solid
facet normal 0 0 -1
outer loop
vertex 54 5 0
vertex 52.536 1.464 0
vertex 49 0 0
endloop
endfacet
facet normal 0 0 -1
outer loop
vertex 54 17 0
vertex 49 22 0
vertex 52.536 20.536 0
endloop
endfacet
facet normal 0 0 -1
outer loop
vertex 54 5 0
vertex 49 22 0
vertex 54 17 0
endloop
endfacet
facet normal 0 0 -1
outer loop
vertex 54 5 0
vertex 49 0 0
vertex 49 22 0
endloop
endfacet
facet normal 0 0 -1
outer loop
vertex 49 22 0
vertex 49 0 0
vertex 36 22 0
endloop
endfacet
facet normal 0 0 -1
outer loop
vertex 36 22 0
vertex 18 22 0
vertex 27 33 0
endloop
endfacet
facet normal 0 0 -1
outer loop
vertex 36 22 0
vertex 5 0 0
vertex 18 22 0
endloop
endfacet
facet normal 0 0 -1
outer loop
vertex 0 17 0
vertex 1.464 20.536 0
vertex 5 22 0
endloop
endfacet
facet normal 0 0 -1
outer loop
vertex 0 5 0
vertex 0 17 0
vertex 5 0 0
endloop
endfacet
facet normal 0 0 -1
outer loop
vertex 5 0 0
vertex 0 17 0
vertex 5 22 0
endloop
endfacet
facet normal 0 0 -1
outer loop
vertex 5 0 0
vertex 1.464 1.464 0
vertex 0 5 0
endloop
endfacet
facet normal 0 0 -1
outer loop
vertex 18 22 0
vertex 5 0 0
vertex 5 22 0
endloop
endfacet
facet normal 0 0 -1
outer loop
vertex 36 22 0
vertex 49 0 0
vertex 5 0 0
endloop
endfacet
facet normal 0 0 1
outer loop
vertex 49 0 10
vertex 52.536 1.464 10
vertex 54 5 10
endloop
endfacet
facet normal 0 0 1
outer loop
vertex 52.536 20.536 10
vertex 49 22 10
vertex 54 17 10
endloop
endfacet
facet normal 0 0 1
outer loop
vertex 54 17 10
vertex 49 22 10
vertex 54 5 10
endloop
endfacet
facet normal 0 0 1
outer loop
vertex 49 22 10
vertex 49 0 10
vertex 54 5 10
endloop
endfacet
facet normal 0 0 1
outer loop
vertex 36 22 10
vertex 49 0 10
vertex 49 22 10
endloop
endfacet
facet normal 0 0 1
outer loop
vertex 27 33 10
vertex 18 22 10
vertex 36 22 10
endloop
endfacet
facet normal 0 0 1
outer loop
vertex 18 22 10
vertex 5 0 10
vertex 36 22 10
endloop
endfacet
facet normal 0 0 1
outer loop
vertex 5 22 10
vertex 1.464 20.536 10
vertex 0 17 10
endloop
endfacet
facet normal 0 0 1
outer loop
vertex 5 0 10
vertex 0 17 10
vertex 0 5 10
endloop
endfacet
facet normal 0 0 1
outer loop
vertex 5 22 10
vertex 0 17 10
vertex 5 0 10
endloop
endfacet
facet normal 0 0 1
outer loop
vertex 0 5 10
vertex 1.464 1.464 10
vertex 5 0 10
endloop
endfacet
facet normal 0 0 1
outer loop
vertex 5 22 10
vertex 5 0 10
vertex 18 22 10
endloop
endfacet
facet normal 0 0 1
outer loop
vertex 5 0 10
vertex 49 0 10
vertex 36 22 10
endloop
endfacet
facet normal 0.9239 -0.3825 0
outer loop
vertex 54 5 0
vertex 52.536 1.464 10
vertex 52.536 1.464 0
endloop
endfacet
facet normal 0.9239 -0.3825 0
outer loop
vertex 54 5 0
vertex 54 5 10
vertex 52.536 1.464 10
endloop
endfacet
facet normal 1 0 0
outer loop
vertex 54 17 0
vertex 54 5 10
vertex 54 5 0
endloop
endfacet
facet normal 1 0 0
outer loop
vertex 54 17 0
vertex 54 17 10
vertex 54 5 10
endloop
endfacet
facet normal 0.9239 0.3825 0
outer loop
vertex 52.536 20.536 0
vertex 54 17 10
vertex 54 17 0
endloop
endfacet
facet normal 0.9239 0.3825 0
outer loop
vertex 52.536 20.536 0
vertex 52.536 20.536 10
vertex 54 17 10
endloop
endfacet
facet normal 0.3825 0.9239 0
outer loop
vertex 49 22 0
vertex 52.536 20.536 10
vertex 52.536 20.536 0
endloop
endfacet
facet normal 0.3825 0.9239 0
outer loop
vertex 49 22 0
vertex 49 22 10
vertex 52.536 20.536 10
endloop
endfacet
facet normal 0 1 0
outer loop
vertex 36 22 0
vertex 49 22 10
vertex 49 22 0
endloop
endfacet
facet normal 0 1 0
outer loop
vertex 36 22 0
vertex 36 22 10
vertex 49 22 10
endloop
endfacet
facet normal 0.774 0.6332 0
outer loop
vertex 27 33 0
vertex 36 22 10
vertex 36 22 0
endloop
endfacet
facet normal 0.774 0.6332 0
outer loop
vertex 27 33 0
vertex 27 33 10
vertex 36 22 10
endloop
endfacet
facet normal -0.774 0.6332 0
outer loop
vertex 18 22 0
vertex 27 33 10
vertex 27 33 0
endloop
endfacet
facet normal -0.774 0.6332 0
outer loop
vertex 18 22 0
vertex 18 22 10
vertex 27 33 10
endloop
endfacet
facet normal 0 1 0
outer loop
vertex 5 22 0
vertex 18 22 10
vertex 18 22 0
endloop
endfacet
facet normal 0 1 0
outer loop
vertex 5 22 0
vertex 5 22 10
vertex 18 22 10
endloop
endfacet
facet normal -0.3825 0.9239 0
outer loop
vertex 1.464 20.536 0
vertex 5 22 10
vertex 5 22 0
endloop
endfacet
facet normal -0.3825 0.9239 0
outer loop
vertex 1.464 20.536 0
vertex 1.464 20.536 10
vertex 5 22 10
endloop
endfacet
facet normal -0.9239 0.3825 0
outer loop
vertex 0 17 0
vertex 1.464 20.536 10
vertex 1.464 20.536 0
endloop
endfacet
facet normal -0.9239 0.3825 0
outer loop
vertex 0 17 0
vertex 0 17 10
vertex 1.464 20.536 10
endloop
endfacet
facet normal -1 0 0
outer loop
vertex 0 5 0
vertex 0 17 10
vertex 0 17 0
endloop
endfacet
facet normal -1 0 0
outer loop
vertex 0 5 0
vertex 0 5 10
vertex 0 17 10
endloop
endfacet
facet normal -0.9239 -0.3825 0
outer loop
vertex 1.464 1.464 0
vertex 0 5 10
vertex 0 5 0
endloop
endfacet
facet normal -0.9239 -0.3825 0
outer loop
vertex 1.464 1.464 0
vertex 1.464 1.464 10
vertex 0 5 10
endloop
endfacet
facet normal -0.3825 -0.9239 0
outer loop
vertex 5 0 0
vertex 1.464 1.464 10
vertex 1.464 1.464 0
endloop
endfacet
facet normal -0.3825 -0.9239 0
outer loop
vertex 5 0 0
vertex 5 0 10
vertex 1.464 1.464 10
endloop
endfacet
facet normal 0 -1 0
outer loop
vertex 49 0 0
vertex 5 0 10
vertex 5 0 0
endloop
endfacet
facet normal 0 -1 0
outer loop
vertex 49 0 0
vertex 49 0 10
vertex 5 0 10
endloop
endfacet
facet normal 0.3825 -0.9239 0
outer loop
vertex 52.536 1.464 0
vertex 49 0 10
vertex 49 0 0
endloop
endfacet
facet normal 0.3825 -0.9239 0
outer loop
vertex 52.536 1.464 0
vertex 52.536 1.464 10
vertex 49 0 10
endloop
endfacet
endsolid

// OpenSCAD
$fn = 32;

// ----------------------------------------------------------------------
// Ratchet pawl: 54 x 22 mm body, beak 11 mm сверху
// ----------------------------------------------------------------------

// --- parameters (mm) ---
profile_height = 10;      // extrusion height
profile_points = 15;      // points of the closed outline

profile = [[0, 5], [1.464, 1.464], [5, 0], [49, 0], [52.536, 1.464], [54, 5], [54, 17], [52.536, 20.536], [49, 22], [36, 22], [27, 33], [18, 22], [5, 22], [1.464, 20.536], [0, 17]];  // single closed polygon, 15 points, counter clockwise

// --- the one profile operation ---
linear_extrude(height = profile_height) polygon(points = profile);
